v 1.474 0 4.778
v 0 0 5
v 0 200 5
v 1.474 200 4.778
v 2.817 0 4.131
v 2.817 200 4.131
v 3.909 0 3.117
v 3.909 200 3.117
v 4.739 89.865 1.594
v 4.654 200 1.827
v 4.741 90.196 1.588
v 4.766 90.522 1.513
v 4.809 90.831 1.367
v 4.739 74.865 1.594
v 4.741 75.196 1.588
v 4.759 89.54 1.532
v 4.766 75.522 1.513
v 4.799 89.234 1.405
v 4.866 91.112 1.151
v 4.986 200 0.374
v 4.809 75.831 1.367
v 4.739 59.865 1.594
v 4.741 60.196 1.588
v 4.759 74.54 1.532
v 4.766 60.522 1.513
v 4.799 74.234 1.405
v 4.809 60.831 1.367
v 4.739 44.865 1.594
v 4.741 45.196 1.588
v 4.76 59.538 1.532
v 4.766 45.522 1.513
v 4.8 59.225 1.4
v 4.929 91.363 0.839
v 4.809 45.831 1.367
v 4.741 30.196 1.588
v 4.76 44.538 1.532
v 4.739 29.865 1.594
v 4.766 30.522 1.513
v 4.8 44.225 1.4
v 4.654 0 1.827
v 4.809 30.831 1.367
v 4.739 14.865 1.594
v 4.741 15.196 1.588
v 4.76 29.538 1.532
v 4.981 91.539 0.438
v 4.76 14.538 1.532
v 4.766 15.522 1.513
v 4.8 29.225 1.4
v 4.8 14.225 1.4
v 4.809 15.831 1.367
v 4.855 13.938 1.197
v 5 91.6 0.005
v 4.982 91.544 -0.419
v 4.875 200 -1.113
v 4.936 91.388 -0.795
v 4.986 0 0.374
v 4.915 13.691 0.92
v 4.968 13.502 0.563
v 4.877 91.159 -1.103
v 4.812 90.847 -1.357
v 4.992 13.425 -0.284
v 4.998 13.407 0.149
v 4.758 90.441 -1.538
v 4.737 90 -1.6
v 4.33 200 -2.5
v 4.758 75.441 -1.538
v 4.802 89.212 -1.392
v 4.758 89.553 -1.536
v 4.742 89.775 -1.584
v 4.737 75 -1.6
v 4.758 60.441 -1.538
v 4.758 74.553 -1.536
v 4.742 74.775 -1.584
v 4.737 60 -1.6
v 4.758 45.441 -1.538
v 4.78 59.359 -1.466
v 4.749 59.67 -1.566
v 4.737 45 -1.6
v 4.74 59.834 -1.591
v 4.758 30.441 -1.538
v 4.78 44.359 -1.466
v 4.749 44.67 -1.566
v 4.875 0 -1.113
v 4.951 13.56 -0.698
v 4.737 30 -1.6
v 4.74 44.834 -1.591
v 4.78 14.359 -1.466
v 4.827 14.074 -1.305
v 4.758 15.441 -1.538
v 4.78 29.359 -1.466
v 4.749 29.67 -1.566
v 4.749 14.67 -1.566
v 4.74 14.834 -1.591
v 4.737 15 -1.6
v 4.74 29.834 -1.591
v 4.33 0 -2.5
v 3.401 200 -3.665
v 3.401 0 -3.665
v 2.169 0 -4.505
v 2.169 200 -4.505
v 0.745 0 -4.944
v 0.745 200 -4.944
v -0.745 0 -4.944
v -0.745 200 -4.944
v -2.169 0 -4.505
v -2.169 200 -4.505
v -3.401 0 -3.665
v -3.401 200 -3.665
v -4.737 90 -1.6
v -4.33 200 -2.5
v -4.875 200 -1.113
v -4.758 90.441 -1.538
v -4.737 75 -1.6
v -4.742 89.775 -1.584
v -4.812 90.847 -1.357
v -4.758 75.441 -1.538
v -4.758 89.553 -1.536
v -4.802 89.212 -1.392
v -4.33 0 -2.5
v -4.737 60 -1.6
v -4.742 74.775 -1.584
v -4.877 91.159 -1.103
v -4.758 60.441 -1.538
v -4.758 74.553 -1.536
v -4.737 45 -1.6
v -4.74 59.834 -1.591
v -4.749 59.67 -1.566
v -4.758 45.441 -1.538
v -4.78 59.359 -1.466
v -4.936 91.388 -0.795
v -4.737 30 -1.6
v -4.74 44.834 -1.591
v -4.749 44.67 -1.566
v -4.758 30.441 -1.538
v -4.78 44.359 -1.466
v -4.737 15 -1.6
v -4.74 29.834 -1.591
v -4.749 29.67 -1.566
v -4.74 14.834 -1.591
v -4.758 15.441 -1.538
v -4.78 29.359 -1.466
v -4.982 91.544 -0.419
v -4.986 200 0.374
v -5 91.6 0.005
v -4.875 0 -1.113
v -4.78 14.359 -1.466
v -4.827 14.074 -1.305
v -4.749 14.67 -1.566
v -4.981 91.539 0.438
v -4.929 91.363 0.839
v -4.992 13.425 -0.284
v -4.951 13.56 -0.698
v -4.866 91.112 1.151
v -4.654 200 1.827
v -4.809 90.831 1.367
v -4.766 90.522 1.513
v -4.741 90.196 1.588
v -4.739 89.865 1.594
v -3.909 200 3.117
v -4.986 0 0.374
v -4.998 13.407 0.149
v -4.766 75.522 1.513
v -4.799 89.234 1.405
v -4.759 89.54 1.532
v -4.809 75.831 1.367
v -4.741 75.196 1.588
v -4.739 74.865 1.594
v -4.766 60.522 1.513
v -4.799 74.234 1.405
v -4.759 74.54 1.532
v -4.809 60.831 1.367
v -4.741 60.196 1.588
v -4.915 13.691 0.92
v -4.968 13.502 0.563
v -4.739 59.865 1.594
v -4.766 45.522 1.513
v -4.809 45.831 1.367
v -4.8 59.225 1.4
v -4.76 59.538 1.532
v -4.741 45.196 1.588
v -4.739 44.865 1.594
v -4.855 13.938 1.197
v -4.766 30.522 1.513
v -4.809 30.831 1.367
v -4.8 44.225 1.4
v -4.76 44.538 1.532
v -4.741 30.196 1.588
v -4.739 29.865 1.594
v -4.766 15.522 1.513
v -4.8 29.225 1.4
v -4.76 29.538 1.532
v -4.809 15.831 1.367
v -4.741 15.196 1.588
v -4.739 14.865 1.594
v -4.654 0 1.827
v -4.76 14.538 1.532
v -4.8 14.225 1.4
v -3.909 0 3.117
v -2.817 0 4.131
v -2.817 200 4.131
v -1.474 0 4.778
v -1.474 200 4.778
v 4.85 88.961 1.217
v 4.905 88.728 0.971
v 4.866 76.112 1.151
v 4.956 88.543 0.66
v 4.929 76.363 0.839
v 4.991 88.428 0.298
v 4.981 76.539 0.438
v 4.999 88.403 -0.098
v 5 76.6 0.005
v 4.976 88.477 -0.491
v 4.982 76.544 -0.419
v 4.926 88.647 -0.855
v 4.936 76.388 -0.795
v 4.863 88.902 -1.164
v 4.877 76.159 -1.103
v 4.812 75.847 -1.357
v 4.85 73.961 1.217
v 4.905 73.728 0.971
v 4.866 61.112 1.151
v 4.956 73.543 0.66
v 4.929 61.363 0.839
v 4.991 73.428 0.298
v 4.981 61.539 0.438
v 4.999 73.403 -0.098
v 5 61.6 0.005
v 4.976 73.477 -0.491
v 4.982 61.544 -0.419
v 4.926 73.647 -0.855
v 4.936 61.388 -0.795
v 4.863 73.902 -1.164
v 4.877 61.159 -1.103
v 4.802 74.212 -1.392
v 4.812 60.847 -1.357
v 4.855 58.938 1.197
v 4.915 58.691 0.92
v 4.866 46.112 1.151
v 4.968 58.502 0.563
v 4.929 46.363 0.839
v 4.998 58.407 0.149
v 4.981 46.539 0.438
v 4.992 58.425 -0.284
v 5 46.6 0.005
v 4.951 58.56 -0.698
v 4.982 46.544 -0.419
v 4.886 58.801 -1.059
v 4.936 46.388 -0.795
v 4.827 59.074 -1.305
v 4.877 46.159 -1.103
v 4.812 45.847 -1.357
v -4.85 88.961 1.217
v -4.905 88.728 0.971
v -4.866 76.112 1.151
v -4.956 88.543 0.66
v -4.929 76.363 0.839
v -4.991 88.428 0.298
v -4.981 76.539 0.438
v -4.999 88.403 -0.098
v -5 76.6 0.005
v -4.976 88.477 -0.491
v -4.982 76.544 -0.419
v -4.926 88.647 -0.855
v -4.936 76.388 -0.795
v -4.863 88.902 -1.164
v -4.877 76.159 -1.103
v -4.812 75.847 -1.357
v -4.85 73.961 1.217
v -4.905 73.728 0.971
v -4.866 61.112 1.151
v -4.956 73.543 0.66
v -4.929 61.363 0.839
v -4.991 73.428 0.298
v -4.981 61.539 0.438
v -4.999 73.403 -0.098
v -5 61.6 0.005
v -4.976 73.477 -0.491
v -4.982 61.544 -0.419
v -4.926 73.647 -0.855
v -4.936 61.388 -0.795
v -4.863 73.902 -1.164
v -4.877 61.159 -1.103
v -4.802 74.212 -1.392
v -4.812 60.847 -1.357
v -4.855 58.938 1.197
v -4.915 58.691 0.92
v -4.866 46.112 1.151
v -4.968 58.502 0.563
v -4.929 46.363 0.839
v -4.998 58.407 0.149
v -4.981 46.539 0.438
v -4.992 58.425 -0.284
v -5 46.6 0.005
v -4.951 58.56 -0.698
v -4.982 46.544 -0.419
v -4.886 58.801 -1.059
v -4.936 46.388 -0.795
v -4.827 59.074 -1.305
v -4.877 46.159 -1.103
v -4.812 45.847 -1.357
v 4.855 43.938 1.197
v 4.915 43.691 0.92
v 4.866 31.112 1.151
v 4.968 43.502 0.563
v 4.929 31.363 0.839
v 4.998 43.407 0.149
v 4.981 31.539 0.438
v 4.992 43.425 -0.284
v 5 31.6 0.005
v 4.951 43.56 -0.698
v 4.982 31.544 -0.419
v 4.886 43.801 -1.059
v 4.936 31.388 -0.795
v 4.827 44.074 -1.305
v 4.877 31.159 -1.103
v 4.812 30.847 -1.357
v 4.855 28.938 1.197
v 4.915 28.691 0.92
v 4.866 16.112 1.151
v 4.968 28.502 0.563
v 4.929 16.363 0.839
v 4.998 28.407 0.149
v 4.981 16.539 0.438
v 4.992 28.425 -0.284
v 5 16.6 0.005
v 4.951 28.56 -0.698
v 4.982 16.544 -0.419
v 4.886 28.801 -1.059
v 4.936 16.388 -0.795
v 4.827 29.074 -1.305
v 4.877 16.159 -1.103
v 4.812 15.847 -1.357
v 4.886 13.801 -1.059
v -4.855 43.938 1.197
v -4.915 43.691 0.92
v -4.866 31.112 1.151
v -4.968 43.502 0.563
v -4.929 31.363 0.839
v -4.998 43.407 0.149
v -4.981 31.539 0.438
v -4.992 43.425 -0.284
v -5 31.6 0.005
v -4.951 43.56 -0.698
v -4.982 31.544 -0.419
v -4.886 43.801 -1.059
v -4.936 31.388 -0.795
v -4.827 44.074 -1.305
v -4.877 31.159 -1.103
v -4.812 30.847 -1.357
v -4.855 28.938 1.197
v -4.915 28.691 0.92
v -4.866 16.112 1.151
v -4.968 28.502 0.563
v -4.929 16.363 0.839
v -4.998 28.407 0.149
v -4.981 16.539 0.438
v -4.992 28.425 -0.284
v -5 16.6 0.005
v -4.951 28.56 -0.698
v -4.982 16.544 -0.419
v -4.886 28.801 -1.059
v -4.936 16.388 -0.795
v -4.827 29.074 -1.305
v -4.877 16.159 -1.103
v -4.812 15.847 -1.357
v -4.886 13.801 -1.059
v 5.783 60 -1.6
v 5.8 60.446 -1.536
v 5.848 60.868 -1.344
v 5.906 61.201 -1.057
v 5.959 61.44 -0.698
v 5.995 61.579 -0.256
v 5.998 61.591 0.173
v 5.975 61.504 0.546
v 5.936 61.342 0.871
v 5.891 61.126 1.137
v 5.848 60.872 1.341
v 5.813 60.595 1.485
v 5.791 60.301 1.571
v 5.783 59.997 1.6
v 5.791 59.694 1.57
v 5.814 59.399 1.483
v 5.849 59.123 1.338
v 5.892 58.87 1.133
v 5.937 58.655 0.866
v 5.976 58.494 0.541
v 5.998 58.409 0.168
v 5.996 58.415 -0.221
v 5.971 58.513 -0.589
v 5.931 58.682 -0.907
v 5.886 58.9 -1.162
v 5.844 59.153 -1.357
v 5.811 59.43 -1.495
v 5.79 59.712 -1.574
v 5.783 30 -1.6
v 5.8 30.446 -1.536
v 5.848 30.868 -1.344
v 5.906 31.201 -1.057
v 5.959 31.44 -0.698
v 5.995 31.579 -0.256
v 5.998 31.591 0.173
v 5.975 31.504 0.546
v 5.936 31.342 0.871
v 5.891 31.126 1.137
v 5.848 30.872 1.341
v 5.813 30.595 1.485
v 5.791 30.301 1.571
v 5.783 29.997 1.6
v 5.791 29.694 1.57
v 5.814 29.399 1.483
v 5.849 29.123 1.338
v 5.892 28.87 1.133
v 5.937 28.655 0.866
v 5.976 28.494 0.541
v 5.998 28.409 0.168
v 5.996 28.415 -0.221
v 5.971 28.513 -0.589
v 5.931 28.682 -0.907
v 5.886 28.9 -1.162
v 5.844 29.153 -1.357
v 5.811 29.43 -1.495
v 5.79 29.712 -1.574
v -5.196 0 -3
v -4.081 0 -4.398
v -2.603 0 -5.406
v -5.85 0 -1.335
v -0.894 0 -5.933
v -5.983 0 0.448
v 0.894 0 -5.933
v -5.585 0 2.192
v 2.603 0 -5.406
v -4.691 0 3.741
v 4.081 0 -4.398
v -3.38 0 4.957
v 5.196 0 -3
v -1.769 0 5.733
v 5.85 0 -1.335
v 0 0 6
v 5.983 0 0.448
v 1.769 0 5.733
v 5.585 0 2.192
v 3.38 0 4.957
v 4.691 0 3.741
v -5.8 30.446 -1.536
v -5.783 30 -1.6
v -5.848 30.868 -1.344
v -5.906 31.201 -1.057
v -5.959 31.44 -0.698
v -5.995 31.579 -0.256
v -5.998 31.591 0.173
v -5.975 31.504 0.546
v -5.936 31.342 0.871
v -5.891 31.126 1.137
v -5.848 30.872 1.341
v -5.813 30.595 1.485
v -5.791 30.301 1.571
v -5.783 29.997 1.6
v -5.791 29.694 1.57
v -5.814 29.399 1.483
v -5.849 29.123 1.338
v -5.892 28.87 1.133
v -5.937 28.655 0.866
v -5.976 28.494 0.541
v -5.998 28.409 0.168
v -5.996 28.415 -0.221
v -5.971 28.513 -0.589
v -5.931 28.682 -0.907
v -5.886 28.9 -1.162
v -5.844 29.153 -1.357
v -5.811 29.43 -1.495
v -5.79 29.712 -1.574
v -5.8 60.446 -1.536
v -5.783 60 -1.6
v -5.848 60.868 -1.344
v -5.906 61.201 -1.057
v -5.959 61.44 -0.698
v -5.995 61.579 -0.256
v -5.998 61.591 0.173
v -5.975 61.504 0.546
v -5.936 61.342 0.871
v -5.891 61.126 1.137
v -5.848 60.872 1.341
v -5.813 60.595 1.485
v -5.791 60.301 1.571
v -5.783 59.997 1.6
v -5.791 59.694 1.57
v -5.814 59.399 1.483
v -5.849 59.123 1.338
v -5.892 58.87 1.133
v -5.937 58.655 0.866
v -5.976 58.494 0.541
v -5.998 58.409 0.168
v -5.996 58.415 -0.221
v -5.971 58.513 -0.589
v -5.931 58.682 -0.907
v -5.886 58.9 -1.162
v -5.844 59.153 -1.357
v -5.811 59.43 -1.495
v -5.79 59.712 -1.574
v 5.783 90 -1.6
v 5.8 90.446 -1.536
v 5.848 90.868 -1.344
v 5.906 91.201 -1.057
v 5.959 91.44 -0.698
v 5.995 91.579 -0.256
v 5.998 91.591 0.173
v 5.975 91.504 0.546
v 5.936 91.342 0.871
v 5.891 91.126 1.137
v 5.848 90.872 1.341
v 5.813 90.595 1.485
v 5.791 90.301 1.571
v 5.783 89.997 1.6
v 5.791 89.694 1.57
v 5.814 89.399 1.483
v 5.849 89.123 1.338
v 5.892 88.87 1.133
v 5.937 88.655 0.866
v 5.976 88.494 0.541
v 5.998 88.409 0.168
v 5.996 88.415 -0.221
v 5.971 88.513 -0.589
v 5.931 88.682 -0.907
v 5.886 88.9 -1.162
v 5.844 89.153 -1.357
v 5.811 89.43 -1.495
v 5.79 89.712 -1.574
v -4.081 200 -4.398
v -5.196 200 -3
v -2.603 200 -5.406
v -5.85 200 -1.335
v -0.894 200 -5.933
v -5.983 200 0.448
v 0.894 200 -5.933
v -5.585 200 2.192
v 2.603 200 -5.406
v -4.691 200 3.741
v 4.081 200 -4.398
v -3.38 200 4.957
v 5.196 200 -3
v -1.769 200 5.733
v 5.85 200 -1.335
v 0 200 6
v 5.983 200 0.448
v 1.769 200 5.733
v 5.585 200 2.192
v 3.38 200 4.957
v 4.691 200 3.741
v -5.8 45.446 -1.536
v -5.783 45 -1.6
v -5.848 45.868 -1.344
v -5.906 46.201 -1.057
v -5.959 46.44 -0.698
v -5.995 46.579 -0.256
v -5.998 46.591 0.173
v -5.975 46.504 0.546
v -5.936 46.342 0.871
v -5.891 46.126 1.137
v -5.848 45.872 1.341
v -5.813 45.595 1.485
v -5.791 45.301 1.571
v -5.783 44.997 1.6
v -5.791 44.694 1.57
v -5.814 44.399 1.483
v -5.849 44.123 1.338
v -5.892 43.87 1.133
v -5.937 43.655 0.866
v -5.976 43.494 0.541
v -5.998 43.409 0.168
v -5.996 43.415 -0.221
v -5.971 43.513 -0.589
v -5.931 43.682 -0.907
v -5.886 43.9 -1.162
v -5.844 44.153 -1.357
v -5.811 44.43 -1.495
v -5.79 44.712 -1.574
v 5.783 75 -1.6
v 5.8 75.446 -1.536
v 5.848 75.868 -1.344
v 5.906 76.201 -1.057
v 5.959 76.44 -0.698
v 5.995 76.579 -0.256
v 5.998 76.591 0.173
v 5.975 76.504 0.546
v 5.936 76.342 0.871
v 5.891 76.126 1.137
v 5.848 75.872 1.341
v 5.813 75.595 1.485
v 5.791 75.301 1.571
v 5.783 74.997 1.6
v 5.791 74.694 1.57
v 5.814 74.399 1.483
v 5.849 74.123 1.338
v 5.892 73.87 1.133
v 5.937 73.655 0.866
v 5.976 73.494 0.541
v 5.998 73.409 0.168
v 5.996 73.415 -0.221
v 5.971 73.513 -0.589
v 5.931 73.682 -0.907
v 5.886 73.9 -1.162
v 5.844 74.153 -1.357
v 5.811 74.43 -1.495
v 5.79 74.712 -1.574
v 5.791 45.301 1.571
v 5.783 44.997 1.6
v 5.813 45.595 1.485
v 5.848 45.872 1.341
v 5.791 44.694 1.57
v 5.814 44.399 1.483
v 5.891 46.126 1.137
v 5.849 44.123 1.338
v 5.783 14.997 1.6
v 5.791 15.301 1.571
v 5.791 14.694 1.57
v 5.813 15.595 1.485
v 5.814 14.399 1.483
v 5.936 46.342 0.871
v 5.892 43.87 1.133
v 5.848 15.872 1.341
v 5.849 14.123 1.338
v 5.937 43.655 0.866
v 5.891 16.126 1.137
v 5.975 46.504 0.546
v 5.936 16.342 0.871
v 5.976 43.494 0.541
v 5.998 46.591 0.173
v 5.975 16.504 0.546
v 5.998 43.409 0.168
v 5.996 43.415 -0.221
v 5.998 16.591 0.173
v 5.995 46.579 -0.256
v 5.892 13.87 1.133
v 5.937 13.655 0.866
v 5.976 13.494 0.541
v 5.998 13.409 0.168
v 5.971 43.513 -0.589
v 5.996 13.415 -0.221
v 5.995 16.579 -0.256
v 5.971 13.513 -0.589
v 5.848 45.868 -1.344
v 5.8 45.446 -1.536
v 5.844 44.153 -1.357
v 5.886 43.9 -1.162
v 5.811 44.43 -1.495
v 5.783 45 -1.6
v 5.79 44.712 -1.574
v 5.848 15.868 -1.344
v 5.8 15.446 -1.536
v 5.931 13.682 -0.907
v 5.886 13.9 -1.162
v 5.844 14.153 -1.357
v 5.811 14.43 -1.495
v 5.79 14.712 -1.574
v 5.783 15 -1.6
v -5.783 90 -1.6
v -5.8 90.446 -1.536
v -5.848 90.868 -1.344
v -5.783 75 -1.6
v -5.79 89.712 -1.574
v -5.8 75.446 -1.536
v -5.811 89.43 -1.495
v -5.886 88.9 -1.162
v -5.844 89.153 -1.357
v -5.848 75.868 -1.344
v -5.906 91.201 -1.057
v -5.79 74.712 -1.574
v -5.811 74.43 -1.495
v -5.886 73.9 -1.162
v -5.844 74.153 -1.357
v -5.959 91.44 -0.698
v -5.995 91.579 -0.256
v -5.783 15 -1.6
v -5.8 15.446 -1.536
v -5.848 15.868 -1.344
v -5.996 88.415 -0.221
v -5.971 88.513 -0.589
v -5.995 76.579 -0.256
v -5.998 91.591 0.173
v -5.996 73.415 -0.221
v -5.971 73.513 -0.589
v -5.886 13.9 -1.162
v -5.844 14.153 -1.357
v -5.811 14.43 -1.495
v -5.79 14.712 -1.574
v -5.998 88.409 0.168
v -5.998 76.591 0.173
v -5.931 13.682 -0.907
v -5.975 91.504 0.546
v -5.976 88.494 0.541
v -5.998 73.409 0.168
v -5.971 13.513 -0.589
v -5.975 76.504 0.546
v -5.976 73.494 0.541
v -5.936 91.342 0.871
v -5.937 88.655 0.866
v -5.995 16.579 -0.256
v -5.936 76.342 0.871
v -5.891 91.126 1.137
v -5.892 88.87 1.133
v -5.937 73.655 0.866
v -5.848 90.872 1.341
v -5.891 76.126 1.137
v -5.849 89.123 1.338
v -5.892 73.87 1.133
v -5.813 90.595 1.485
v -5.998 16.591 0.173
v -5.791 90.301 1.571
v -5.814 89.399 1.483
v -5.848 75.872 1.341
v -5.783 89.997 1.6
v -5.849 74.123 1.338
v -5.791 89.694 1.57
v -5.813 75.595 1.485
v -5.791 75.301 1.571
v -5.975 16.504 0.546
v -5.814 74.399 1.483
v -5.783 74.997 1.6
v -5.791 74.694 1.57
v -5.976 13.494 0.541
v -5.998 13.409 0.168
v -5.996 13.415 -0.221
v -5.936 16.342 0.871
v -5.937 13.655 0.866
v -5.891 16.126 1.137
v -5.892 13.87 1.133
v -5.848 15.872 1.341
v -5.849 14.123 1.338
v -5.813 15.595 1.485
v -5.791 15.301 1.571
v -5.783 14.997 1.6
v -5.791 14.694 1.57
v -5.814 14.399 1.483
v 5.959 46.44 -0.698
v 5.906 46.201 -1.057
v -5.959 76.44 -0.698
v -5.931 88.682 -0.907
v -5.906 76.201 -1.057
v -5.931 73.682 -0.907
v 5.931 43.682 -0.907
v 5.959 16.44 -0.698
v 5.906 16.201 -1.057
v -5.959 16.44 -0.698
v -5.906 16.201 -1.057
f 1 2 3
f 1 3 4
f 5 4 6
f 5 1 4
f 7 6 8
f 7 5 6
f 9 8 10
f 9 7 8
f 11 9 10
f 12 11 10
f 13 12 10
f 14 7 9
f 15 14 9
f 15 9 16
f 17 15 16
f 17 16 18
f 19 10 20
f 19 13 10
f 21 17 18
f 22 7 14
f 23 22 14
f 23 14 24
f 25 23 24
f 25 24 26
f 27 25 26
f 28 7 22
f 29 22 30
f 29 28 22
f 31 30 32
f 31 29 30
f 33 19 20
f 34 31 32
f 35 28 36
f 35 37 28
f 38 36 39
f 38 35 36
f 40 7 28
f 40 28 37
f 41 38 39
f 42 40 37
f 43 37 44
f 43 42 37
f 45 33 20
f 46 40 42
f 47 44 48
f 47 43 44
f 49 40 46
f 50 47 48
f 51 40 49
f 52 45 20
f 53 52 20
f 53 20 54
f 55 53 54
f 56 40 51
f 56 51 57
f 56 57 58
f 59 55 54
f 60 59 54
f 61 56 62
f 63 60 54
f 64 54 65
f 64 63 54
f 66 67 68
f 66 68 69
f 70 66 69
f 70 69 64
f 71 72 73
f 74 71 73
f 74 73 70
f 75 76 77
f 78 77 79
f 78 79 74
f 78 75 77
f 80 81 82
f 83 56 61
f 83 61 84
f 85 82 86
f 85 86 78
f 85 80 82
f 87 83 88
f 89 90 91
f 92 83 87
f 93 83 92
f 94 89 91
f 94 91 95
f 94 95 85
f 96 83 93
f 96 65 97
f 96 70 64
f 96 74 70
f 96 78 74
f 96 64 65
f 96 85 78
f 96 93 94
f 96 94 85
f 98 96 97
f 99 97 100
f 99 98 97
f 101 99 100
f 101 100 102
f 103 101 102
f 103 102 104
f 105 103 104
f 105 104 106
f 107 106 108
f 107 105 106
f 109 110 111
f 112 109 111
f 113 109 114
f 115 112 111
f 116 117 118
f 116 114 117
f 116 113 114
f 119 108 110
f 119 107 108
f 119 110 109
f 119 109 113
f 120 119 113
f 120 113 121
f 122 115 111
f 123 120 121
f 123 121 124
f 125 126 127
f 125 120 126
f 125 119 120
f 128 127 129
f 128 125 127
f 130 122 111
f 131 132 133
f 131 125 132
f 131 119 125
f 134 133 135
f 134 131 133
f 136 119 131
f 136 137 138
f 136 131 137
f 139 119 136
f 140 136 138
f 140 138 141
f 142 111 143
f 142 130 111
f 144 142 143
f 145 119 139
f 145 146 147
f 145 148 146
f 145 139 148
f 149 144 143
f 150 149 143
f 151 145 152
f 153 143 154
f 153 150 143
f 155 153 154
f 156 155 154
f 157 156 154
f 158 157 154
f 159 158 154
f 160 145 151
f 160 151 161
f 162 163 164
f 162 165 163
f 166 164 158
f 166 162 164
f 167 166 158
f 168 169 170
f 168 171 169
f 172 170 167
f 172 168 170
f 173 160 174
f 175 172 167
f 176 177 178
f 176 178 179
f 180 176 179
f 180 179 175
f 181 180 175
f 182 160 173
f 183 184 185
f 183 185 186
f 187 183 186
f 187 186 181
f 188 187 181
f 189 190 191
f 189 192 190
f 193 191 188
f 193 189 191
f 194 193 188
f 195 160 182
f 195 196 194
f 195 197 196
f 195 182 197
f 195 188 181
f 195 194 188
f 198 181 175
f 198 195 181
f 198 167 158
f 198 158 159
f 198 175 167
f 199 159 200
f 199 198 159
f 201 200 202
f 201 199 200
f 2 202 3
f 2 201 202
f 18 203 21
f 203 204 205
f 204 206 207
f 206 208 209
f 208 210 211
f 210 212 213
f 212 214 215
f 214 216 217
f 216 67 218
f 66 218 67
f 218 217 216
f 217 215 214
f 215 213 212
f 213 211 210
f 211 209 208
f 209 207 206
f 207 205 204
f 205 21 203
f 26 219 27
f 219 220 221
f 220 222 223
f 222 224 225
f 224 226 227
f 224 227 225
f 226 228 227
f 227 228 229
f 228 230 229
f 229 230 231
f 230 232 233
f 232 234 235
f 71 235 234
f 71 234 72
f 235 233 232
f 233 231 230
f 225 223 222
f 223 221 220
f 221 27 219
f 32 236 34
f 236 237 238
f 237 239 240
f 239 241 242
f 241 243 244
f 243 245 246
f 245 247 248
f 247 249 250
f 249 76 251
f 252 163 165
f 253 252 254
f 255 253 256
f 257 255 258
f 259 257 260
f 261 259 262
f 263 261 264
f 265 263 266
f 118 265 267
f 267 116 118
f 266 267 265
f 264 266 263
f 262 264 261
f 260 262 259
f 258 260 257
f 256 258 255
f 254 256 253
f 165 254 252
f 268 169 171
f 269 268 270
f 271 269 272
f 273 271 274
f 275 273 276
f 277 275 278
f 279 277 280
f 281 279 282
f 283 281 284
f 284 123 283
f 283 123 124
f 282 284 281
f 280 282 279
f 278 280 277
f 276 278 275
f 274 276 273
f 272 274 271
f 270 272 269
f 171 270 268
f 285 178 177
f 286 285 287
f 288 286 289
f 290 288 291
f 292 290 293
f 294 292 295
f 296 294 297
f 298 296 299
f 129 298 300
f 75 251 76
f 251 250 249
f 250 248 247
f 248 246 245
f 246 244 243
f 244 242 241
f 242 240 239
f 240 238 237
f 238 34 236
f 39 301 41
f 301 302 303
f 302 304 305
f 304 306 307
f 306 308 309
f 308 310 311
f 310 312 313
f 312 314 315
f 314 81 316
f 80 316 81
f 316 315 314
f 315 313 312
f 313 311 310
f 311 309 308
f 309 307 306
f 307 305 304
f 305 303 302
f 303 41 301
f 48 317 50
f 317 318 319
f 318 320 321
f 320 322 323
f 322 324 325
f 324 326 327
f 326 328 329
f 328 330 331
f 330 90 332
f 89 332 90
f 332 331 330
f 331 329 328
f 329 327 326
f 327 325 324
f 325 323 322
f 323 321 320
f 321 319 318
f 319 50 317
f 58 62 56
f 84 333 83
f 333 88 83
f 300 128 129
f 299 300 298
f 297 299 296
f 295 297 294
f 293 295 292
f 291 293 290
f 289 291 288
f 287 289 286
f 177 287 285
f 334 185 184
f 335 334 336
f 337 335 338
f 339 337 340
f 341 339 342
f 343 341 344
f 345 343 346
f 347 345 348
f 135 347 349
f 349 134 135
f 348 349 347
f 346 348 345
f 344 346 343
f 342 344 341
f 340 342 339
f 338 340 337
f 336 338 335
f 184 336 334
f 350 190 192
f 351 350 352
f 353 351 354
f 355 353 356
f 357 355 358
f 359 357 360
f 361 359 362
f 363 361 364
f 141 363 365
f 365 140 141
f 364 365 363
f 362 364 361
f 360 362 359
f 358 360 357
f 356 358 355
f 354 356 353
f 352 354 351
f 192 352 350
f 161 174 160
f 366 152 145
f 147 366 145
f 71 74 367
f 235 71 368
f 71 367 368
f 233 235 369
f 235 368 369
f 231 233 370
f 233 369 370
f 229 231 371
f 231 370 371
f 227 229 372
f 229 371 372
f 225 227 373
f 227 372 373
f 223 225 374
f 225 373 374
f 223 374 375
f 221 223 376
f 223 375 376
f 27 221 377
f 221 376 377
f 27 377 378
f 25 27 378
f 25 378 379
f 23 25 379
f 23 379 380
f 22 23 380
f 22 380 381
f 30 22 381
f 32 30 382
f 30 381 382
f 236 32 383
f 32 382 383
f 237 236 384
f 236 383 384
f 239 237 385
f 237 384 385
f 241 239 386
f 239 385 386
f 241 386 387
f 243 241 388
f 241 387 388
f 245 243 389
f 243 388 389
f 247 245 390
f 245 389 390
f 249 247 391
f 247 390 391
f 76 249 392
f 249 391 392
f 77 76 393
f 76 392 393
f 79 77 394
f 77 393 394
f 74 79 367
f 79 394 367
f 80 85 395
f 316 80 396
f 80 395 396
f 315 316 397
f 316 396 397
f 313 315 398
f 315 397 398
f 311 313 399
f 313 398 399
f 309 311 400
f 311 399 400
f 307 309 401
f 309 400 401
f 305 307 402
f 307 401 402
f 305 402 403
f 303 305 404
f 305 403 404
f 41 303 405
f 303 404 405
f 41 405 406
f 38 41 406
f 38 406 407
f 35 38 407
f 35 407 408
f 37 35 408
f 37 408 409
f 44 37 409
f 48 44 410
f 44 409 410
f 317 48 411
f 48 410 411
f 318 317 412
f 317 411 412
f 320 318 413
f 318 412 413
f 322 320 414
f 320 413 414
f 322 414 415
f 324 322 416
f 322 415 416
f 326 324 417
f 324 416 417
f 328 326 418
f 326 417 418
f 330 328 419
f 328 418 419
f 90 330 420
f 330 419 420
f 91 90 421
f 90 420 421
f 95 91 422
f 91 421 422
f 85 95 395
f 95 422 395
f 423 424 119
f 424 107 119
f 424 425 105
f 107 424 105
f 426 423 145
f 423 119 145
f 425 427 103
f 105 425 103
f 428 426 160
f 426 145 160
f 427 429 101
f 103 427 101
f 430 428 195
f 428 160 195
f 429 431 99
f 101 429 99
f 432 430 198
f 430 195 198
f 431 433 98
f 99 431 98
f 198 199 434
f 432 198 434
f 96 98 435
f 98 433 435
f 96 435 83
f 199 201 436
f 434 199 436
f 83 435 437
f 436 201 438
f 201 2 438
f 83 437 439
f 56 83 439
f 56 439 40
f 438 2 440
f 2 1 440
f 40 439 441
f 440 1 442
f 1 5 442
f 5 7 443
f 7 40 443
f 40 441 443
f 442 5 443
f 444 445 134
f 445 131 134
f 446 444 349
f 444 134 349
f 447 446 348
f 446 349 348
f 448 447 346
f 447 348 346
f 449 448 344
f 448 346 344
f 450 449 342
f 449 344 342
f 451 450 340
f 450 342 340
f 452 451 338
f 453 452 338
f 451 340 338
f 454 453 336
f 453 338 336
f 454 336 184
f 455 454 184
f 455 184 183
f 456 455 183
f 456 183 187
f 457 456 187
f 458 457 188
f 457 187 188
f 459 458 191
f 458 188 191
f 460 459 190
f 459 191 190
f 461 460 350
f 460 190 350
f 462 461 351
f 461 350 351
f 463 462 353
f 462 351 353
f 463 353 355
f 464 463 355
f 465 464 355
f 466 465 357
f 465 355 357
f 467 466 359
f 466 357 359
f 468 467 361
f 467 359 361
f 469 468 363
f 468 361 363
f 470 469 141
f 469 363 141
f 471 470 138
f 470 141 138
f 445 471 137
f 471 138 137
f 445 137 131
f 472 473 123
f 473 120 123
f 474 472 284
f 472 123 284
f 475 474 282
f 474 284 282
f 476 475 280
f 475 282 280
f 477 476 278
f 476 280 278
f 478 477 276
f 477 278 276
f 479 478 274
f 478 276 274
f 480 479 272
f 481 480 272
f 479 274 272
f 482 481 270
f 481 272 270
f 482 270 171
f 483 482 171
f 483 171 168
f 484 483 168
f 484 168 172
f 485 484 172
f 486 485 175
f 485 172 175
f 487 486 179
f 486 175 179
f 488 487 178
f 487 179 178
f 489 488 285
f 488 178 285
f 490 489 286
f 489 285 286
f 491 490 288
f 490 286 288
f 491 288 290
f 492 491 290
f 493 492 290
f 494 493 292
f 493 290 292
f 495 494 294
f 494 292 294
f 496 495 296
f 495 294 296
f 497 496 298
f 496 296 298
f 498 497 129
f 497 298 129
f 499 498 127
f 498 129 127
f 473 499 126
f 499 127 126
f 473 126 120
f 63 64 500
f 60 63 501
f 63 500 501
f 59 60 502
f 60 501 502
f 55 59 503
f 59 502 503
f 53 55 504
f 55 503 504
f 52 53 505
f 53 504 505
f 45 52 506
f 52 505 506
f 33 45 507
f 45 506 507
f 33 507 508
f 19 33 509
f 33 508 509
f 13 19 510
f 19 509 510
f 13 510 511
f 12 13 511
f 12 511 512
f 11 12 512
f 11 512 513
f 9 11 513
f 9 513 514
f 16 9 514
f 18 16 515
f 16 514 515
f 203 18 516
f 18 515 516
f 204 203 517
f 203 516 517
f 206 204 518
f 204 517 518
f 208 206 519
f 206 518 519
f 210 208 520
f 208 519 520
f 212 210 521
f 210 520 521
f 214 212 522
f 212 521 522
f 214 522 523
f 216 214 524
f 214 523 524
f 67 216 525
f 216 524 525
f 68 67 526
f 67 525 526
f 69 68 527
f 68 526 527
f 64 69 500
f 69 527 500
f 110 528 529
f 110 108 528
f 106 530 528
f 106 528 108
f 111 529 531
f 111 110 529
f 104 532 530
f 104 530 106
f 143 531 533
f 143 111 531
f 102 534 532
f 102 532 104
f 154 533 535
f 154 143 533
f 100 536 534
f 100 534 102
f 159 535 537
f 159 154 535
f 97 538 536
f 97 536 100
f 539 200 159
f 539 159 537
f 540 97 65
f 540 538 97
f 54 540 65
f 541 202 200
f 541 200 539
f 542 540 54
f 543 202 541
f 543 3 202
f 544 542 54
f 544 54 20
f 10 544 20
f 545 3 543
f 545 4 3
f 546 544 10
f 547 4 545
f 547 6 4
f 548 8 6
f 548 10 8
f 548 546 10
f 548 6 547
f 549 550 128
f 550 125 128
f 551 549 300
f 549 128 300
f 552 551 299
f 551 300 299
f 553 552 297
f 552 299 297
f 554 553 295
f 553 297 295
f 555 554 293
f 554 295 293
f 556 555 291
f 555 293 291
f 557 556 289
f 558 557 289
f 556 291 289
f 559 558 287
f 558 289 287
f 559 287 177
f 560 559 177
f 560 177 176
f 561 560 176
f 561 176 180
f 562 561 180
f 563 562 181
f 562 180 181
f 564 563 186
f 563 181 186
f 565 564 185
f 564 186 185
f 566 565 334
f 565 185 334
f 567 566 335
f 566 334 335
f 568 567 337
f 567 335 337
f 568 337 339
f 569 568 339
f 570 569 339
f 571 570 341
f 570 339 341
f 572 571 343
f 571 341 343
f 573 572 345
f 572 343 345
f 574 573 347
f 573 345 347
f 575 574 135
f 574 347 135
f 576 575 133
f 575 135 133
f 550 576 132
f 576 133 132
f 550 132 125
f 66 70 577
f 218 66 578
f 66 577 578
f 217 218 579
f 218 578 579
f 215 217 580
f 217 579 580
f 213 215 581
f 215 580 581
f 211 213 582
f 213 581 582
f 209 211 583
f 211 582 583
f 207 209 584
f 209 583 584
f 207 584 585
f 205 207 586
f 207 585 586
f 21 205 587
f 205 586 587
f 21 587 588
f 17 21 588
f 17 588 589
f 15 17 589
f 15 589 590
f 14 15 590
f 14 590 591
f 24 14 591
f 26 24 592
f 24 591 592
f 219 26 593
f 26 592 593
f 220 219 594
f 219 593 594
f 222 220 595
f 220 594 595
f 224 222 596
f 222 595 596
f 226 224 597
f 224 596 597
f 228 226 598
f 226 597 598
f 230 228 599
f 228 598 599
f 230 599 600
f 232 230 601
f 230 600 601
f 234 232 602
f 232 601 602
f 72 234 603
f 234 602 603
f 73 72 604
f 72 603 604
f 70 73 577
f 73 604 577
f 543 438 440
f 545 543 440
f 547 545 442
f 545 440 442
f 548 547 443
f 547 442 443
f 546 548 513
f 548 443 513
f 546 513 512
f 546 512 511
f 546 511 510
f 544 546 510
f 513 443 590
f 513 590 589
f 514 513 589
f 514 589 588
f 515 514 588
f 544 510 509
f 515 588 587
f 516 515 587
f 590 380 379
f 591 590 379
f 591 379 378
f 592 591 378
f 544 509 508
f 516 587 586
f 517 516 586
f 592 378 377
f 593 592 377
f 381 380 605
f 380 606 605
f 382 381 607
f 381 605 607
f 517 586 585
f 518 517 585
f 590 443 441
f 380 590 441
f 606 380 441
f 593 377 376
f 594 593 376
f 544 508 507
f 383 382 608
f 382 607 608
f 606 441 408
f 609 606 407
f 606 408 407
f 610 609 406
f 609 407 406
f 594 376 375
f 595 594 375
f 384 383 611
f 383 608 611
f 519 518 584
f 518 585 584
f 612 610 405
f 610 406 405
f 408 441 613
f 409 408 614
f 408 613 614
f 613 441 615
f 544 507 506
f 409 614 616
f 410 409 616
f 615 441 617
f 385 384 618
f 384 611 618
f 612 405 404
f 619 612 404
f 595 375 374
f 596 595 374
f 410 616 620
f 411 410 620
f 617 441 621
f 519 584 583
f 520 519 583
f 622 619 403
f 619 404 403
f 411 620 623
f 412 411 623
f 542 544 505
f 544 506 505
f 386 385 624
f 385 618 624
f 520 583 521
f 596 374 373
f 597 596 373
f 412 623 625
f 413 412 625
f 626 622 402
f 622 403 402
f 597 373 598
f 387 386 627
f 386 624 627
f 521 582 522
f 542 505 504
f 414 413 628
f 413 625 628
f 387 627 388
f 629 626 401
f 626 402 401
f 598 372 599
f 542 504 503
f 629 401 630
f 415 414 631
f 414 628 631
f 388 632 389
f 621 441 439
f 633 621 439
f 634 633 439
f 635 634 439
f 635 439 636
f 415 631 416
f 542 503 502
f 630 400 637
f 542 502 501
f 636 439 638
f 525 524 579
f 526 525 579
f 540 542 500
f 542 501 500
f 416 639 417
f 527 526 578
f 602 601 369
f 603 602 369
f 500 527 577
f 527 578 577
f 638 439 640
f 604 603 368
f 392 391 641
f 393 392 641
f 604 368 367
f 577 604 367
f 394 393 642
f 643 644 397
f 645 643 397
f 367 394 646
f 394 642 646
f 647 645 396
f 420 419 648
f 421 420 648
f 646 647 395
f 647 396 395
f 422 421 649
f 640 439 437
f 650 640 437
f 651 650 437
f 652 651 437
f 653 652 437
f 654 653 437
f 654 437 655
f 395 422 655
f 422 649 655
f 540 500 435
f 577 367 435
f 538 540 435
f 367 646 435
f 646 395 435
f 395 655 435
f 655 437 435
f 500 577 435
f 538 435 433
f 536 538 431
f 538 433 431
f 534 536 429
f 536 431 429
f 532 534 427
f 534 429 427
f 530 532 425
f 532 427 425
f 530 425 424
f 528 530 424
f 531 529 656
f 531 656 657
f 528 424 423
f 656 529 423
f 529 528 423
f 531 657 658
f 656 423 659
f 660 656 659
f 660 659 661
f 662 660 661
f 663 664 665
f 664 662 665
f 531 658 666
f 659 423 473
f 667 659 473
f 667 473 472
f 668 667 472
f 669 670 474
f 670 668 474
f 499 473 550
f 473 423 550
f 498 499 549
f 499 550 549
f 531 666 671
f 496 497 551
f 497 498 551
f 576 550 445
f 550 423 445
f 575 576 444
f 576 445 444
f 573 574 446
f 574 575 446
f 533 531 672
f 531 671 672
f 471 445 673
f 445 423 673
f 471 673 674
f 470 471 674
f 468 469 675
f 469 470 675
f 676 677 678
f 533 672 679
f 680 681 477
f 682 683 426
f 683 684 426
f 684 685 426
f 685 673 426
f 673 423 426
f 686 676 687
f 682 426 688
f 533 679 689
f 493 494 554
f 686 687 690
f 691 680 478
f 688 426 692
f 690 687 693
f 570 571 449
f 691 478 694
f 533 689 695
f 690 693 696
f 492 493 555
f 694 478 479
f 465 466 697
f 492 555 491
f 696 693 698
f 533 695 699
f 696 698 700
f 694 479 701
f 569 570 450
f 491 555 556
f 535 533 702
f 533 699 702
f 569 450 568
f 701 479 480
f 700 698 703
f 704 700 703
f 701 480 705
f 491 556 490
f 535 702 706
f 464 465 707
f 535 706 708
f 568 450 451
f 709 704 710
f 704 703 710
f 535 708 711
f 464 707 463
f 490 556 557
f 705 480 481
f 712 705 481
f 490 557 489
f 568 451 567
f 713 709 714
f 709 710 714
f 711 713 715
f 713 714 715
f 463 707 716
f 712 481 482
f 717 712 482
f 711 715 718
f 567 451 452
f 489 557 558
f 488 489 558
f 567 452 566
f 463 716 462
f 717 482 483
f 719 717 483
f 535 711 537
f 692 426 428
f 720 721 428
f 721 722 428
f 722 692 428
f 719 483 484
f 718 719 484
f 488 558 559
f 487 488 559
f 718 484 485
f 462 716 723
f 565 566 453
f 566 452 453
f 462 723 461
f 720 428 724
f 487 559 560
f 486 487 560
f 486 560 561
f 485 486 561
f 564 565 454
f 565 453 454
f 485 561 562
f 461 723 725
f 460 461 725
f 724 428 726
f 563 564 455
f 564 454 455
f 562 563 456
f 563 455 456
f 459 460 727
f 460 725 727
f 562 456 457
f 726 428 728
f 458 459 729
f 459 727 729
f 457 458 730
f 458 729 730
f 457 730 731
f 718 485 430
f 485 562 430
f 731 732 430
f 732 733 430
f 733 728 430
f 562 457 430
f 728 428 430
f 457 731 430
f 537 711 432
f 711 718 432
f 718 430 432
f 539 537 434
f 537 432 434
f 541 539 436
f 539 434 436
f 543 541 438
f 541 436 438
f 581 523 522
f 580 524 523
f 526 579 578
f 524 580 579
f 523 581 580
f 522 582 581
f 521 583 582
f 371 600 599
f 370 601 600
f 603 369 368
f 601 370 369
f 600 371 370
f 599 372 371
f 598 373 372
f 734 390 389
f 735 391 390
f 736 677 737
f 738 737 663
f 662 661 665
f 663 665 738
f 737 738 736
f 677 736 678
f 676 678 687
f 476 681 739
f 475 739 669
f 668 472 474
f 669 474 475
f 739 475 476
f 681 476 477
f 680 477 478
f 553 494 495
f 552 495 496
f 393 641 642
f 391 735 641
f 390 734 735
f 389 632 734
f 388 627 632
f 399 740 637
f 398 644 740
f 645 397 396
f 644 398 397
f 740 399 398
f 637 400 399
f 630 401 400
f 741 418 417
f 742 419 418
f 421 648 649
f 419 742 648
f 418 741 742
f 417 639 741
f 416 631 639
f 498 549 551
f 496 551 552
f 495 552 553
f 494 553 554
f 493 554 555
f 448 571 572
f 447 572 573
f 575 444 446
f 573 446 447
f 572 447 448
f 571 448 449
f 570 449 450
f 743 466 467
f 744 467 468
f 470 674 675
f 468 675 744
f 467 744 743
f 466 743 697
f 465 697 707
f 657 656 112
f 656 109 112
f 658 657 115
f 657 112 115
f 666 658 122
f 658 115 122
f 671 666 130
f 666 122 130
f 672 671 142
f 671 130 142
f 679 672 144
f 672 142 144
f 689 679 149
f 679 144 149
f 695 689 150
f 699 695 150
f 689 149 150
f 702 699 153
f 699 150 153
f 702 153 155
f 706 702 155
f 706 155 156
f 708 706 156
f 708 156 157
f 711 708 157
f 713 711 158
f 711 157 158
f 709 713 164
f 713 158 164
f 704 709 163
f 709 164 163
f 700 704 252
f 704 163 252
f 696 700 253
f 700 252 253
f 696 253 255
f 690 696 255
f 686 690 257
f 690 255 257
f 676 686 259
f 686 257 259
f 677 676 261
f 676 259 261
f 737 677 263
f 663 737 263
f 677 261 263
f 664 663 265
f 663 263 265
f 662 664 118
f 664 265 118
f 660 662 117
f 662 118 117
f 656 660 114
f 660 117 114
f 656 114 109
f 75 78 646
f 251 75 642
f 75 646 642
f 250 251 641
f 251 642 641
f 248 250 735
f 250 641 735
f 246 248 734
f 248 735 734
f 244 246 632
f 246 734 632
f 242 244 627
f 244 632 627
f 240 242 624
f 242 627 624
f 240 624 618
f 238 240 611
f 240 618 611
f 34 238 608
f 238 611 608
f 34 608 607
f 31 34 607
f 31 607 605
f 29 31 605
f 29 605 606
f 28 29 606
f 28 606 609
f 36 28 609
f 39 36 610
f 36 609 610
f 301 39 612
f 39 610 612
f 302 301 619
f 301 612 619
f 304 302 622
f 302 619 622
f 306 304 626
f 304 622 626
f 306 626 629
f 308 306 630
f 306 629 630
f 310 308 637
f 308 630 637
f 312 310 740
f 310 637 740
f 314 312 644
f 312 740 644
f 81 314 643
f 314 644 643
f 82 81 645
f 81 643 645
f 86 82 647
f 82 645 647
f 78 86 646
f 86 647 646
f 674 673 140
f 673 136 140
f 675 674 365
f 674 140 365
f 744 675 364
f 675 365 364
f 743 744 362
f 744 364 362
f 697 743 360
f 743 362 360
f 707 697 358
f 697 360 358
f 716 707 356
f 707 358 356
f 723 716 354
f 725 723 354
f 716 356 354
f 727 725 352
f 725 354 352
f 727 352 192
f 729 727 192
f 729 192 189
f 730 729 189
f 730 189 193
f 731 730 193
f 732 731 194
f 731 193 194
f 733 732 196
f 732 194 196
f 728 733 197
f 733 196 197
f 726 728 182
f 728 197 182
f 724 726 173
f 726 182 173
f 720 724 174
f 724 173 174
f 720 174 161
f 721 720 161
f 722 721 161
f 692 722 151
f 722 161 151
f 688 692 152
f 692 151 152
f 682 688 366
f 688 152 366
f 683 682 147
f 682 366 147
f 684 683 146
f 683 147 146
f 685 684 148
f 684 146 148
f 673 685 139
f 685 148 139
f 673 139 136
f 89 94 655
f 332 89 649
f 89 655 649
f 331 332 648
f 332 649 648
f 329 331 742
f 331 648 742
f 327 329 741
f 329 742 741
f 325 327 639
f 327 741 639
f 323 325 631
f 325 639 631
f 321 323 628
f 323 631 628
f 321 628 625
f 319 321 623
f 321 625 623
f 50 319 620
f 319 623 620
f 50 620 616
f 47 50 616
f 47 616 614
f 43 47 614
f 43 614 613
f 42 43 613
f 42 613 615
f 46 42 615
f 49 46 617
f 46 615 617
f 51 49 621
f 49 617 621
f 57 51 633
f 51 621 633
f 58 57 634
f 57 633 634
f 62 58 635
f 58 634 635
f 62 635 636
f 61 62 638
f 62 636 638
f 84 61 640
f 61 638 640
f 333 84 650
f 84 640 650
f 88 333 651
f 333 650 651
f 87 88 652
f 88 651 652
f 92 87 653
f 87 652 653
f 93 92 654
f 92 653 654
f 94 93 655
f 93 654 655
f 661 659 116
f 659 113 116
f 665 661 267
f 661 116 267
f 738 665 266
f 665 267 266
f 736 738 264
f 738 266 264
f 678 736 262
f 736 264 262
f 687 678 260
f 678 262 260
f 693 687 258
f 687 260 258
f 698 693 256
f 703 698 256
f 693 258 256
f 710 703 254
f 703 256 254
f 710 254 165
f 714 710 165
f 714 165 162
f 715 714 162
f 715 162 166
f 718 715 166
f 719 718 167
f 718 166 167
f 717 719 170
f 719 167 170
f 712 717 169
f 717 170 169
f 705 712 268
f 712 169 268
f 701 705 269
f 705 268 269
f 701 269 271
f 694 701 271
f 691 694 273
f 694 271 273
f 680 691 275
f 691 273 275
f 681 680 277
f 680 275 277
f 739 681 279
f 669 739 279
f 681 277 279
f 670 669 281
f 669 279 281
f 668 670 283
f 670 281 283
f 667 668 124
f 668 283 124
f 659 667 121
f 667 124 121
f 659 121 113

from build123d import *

# Parameters (mm, degrees)
SKETCH_1_R             = 6
SKETCH_1_R_2           = 5
EXTRUDE_1_DEPTH        = 200
SKETCH_4_R             = 1.6
CUT_EXTRUDE_2_DEPTH    = 201.179919073
PATTERN_LINEAR_1_COUNT = 6
PATTERN_LINEAR_1_PITCH = 15


with BuildPart() as part:
    # 草图1 → 凸台-拉伸1 (new body)
    with BuildSketch(Plane(origin=(0, 0, 0), x_dir=(1, 0, 0), z_dir=(0, 1, 0))):
        with Locations(Location((0, 0, 0), (0, 0, 270))):
            Circle(SKETCH_1_R)
        with Locations(Location((0, 0, 0), (0, 0, 270))):
            Circle(SKETCH_1_R_2, mode=Mode.SUBTRACT)
    extrude(amount=EXTRUDE_1_DEPTH)

    # 草图4 → 切除-拉伸2 (cut, symmetric)
    with BuildSketch(Plane(origin=(0, 0, 0), x_dir=(0, 0, -1), z_dir=(1, 0, 0))):
        with Locations((0, 15)):
            Circle(SKETCH_4_R)
    cut_extrude_2 = extrude(amount=CUT_EXTRUDE_2_DEPTH, both=True, mode=Mode.SUBTRACT)

    # 阵列(线性)1: 切除-拉伸2 ×6
    with Locations(*[(0, i * PATTERN_LINEAR_1_PITCH, 0) for i in range(1, PATTERN_LINEAR_1_COUNT)]):
        add(cut_extrude_2, mode=Mode.SUBTRACT)


solid = part.part
